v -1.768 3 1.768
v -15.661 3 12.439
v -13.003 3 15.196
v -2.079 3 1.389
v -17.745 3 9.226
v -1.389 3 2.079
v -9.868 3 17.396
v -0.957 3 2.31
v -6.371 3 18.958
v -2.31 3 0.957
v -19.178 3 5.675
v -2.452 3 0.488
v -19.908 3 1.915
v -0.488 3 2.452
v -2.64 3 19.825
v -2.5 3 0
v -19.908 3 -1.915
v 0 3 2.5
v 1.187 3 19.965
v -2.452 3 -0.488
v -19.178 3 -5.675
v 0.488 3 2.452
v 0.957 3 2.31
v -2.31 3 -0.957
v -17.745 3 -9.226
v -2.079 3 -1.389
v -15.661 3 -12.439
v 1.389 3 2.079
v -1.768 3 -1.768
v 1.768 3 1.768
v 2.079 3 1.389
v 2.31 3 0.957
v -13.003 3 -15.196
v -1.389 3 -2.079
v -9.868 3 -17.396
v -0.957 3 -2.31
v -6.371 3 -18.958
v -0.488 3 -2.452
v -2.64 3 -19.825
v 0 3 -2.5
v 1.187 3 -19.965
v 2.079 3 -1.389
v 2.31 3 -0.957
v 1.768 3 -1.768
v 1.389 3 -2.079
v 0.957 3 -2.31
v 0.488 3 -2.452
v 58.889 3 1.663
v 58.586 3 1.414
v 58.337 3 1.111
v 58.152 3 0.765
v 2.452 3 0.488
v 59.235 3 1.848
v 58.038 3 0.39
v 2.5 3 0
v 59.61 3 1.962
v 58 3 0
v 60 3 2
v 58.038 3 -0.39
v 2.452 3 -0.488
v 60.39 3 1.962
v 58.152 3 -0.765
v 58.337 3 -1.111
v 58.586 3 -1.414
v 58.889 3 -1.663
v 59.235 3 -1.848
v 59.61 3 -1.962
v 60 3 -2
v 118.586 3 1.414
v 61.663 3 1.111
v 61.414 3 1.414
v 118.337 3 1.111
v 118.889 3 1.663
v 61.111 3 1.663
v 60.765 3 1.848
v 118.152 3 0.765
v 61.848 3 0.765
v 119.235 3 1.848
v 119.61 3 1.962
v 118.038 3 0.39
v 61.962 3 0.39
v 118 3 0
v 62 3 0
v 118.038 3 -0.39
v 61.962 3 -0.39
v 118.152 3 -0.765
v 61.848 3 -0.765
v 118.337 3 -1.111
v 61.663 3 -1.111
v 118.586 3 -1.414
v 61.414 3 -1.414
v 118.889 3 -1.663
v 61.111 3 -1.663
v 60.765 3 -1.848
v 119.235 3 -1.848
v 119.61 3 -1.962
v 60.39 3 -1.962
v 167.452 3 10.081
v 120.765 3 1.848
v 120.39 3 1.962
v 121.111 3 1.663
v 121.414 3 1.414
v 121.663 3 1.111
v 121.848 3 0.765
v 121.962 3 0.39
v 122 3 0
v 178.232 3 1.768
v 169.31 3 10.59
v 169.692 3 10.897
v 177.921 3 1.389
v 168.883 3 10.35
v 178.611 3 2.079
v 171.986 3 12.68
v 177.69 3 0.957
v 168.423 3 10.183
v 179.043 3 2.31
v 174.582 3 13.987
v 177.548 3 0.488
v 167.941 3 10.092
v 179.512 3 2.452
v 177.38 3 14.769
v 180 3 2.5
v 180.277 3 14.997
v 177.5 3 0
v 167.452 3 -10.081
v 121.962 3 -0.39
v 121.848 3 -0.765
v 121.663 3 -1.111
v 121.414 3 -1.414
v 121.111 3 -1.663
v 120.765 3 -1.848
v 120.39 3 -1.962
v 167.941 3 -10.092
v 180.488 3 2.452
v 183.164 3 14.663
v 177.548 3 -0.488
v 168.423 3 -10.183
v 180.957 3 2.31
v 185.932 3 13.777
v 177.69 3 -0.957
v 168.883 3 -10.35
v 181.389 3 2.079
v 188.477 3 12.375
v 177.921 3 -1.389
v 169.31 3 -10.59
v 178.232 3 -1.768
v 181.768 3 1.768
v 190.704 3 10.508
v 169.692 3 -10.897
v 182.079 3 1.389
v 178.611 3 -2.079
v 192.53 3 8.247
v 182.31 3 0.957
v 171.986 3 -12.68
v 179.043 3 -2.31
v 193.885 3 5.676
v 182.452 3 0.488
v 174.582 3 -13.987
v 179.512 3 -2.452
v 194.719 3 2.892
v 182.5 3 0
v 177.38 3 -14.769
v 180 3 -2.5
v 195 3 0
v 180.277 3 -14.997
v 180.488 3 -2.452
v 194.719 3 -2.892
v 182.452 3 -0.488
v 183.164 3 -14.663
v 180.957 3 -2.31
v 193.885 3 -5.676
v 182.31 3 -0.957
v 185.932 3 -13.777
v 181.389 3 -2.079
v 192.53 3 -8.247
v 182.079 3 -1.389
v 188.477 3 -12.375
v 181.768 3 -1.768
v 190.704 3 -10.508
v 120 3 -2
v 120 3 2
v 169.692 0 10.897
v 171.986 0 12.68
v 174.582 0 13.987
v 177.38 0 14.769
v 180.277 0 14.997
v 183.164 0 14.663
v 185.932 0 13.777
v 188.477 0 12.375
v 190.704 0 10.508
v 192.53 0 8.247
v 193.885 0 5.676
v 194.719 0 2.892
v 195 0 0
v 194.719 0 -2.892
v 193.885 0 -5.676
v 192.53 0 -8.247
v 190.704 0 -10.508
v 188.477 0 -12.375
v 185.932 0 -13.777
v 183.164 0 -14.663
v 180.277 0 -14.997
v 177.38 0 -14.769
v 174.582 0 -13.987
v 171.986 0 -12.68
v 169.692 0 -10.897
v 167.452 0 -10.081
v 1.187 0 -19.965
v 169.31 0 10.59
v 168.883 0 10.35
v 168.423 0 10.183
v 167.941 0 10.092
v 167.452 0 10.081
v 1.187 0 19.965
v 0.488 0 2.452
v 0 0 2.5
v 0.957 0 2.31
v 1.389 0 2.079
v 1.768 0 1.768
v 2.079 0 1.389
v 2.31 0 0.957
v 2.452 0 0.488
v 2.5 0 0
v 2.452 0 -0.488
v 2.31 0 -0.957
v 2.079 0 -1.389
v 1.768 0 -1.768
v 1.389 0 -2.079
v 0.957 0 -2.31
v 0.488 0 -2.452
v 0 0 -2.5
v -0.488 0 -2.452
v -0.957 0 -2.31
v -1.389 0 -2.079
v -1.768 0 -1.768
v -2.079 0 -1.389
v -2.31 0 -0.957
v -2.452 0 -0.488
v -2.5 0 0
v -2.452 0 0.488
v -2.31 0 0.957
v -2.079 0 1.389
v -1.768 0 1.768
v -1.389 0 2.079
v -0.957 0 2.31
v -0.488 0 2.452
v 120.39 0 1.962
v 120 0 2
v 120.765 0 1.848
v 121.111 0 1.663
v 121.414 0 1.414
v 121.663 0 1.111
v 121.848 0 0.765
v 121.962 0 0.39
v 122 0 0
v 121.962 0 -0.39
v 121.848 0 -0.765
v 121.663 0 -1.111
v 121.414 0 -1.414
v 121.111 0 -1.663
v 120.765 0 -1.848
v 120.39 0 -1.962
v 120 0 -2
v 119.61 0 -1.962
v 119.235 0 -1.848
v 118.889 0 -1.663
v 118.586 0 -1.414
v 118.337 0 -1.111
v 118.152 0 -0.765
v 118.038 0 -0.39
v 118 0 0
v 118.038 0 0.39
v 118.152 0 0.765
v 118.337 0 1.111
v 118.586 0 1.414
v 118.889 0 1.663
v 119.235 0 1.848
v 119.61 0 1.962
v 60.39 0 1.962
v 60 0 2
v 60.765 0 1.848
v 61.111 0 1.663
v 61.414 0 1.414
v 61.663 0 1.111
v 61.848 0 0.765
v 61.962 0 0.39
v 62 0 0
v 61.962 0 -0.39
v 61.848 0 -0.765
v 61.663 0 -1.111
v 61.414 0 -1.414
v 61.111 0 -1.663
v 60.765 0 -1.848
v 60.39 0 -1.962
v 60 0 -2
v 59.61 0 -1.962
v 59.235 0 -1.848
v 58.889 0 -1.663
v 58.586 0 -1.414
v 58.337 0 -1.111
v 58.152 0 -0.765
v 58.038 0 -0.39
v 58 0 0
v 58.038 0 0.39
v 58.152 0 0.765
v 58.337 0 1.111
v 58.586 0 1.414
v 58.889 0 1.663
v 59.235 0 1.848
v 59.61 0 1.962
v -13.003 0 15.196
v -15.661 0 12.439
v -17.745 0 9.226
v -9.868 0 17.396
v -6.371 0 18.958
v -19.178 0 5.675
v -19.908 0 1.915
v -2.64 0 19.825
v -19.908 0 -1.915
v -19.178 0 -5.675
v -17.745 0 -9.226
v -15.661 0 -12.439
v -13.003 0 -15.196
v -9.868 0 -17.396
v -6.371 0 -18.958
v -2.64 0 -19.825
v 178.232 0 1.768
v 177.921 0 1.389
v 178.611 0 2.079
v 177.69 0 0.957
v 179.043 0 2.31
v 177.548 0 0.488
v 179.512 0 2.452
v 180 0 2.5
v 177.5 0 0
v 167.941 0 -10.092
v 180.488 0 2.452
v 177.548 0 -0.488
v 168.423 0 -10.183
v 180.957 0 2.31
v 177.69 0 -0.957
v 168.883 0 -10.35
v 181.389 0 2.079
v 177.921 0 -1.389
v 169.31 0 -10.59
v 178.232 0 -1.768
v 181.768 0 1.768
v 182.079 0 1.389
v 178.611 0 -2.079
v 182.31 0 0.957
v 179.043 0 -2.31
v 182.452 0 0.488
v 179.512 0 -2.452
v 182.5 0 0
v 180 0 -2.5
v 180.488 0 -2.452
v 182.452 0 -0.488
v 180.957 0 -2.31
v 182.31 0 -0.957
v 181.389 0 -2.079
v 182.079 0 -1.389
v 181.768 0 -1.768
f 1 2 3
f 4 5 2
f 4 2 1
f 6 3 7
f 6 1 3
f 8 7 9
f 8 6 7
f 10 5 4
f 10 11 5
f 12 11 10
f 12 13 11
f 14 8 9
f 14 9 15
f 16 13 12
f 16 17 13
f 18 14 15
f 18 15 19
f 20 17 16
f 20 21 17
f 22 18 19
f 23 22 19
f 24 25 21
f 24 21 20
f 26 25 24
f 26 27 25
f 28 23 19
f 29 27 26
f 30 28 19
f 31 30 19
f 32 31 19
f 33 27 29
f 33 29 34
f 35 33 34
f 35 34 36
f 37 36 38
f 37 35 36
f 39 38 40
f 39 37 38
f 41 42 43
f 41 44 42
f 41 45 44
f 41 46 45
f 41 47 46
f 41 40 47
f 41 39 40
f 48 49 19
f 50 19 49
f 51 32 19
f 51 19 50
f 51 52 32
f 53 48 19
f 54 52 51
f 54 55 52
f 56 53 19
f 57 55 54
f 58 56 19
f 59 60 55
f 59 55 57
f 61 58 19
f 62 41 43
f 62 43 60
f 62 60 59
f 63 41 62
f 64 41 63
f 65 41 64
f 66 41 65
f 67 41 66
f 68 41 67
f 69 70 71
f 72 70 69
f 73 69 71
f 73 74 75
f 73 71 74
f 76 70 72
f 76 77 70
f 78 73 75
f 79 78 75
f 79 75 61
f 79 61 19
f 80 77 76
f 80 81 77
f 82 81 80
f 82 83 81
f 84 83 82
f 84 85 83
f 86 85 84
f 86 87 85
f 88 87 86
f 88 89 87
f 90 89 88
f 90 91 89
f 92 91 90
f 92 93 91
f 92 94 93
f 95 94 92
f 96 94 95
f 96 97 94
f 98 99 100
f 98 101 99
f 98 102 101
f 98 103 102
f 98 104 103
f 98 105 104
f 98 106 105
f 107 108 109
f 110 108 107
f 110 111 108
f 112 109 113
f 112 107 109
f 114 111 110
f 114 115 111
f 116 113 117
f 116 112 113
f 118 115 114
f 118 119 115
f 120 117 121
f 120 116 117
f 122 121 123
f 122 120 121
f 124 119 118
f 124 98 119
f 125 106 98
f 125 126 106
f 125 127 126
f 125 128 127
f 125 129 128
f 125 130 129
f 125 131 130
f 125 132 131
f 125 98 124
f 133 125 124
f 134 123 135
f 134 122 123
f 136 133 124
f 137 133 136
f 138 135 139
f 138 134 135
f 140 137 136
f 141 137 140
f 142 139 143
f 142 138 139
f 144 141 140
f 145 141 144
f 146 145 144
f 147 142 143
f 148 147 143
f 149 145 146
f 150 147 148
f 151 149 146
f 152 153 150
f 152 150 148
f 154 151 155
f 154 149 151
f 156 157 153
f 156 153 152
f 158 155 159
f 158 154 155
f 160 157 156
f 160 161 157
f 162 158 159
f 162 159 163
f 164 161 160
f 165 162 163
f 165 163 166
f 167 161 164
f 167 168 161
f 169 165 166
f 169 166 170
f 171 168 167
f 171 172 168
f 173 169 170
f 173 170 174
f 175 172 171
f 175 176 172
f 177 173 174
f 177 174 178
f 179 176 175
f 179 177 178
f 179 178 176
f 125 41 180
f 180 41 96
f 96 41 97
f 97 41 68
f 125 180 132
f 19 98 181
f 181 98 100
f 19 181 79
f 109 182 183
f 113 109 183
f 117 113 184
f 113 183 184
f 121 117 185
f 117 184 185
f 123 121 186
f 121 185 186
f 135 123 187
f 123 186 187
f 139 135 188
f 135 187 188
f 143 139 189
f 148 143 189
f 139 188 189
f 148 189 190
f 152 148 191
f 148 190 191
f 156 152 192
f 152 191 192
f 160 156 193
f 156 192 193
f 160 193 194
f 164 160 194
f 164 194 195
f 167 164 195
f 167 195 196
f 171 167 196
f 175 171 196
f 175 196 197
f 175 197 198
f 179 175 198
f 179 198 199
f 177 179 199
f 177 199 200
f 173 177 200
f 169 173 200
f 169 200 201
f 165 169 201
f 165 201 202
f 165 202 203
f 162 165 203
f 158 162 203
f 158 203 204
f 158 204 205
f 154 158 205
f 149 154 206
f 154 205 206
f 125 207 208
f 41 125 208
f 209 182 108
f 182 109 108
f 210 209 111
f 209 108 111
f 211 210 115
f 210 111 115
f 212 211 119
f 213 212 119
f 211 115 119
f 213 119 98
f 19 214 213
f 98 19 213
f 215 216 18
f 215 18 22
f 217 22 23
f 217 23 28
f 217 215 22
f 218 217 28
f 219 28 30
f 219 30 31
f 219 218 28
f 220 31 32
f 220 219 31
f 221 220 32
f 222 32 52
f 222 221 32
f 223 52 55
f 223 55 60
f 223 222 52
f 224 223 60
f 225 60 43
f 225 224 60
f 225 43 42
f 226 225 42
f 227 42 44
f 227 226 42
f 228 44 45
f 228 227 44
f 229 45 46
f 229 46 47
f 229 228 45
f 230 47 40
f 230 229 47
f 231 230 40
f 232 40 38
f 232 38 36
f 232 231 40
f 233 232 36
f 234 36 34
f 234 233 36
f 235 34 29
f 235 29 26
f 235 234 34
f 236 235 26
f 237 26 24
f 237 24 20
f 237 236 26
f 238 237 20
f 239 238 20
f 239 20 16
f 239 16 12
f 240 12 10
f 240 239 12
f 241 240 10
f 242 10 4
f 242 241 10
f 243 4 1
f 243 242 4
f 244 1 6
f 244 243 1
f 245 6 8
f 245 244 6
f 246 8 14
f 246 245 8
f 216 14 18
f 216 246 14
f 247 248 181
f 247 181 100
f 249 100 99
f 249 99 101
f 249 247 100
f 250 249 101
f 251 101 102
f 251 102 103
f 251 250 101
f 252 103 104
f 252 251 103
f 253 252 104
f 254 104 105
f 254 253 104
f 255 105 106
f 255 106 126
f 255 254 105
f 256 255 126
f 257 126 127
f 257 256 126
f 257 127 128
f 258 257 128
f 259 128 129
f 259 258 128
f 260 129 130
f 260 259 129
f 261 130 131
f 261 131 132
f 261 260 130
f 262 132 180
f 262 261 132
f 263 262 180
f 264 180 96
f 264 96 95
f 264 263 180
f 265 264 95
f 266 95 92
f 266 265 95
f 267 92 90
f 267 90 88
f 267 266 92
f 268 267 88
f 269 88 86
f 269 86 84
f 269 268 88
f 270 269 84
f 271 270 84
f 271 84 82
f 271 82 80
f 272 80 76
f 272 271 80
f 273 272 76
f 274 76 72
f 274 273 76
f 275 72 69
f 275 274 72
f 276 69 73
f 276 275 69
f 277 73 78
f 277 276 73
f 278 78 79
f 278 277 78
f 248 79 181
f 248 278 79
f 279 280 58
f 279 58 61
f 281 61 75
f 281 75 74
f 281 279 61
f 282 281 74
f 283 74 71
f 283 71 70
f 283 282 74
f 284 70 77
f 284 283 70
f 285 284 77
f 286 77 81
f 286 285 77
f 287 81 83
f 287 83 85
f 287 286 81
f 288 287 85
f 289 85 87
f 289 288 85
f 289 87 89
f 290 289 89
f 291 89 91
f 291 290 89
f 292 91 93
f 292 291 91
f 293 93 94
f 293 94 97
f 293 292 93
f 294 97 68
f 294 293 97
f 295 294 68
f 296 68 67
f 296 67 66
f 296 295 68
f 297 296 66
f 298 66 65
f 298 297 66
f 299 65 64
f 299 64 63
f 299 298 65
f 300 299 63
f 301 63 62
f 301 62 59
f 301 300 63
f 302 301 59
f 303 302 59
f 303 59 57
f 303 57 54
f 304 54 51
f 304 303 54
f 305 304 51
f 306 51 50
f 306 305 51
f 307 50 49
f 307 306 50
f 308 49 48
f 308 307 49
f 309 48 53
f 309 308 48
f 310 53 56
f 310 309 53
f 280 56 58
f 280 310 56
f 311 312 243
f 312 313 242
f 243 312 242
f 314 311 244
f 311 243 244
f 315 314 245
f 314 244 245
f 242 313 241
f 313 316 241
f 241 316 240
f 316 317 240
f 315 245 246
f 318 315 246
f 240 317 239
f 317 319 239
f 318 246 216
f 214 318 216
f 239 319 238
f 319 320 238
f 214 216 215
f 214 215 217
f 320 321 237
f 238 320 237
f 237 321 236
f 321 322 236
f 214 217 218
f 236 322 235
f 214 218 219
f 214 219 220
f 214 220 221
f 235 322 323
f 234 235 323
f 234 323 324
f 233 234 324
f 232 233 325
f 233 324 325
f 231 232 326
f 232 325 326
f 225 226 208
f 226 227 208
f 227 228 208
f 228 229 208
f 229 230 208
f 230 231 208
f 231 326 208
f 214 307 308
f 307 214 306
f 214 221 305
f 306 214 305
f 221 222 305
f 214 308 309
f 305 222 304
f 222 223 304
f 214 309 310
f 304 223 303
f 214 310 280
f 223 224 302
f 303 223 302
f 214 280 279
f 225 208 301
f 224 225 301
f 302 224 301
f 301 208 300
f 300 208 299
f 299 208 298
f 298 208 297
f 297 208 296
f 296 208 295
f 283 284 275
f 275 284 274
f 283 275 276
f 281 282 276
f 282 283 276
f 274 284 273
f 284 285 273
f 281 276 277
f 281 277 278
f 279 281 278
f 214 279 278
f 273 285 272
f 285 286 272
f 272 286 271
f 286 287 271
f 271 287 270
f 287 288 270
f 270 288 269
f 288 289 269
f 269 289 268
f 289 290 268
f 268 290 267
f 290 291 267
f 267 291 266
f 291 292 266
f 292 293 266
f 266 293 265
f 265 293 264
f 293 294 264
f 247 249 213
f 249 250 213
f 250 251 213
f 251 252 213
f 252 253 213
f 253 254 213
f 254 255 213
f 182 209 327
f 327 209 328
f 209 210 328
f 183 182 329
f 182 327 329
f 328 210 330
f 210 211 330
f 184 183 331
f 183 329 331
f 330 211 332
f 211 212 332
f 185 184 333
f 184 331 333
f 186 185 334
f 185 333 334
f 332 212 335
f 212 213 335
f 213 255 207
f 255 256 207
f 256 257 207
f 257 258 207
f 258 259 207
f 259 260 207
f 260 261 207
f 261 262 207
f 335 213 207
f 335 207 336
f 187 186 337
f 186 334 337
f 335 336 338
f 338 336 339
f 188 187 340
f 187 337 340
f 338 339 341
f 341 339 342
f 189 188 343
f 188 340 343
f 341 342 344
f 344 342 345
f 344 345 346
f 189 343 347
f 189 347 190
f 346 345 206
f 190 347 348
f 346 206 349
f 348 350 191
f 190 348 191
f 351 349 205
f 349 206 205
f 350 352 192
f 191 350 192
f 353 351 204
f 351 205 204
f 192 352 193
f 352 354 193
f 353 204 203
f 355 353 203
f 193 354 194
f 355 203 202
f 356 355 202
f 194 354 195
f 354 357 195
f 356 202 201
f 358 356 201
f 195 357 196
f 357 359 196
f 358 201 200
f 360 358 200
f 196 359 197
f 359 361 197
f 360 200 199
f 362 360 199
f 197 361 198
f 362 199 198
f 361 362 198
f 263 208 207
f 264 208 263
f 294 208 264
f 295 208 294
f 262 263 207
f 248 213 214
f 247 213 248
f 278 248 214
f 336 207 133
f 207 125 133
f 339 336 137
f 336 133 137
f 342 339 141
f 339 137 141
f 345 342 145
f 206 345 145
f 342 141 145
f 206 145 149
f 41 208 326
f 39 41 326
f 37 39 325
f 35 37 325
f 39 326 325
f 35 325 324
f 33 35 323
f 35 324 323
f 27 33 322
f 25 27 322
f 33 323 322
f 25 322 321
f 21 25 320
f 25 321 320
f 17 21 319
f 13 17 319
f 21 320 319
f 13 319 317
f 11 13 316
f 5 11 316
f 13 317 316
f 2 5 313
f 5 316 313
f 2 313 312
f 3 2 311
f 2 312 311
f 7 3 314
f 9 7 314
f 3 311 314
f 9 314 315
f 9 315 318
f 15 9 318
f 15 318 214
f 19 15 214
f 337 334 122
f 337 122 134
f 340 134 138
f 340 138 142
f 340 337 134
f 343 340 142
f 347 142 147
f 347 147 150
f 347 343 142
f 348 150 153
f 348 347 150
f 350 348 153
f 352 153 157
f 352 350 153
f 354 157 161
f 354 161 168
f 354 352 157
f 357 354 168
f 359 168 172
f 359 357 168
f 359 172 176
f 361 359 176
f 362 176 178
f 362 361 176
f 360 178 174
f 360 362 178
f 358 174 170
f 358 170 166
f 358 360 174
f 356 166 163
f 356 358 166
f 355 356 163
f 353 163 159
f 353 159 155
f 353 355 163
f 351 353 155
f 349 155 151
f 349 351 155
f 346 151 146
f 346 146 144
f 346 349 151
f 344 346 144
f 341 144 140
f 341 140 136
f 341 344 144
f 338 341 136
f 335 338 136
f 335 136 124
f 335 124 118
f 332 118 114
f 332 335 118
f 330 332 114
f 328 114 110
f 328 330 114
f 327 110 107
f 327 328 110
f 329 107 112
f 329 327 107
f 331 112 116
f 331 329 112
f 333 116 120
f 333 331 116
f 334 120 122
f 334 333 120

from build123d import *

# Parameters (mm, degrees)
SKETCH1_R           = 2
SKETCH1_R_2         = 2.5
BOSS_EXTRUDE1_DEPTH = 3
FILLET2_R           = 3
FILLET3_R           = 3


with BuildPart() as part:
    # Sketch1 → Boss-Extrude1 (new body)
    with BuildSketch(Plane(origin=(0, 0, 0), x_dir=(1, 0, 0), z_dir=(0, 1, 0))):
        with BuildLine():
            ThreePointArc((1.186783721, 19.964757559), (-20, 0), (1.186783721, -19.964757559))
            Line((1.186783721, -19.964757559), (168.819660113, -10))
            ThreePointArc((168.819660113, -10), (195, 0), (168.819660113, 10))
            Line((168.819660113, 10), (1.186783721, 19.964757559))
        make_face()
        with Locations(Location((60, 0, 0), (0, 0, 270))):
            Circle(SKETCH1_R, mode=Mode.SUBTRACT)
        with Locations(Location((0, 0, 0), (0, 0, 270))):
            Circle(SKETCH1_R_2, mode=Mode.SUBTRACT)
        with Locations(Location((120, 0, 0), (0, 0, 270))):
            Circle(SKETCH1_R, mode=Mode.SUBTRACT)
        with Locations(Location((180, 0, 0), (0, 0, 270))):
            Circle(SKETCH1_R_2, mode=Mode.SUBTRACT)
    extrude(amount=BOSS_EXTRUDE1_DEPTH)

    # Fillet2
    fillet2_edges = [part.edges().sort_by_distance(p)[0] for p in [
        (168.819660113, 1.5, -10),
    ]]
    fillet(fillet2_edges, radius=FILLET2_R)

    # Fillet3
    fillet3_edges = [part.edges().sort_by_distance(p)[0] for p in [
        (168.819660113, 1.5, 10),
    ]]
    fillet(fillet3_edges, radius=FILLET3_R)


solid = part.part
